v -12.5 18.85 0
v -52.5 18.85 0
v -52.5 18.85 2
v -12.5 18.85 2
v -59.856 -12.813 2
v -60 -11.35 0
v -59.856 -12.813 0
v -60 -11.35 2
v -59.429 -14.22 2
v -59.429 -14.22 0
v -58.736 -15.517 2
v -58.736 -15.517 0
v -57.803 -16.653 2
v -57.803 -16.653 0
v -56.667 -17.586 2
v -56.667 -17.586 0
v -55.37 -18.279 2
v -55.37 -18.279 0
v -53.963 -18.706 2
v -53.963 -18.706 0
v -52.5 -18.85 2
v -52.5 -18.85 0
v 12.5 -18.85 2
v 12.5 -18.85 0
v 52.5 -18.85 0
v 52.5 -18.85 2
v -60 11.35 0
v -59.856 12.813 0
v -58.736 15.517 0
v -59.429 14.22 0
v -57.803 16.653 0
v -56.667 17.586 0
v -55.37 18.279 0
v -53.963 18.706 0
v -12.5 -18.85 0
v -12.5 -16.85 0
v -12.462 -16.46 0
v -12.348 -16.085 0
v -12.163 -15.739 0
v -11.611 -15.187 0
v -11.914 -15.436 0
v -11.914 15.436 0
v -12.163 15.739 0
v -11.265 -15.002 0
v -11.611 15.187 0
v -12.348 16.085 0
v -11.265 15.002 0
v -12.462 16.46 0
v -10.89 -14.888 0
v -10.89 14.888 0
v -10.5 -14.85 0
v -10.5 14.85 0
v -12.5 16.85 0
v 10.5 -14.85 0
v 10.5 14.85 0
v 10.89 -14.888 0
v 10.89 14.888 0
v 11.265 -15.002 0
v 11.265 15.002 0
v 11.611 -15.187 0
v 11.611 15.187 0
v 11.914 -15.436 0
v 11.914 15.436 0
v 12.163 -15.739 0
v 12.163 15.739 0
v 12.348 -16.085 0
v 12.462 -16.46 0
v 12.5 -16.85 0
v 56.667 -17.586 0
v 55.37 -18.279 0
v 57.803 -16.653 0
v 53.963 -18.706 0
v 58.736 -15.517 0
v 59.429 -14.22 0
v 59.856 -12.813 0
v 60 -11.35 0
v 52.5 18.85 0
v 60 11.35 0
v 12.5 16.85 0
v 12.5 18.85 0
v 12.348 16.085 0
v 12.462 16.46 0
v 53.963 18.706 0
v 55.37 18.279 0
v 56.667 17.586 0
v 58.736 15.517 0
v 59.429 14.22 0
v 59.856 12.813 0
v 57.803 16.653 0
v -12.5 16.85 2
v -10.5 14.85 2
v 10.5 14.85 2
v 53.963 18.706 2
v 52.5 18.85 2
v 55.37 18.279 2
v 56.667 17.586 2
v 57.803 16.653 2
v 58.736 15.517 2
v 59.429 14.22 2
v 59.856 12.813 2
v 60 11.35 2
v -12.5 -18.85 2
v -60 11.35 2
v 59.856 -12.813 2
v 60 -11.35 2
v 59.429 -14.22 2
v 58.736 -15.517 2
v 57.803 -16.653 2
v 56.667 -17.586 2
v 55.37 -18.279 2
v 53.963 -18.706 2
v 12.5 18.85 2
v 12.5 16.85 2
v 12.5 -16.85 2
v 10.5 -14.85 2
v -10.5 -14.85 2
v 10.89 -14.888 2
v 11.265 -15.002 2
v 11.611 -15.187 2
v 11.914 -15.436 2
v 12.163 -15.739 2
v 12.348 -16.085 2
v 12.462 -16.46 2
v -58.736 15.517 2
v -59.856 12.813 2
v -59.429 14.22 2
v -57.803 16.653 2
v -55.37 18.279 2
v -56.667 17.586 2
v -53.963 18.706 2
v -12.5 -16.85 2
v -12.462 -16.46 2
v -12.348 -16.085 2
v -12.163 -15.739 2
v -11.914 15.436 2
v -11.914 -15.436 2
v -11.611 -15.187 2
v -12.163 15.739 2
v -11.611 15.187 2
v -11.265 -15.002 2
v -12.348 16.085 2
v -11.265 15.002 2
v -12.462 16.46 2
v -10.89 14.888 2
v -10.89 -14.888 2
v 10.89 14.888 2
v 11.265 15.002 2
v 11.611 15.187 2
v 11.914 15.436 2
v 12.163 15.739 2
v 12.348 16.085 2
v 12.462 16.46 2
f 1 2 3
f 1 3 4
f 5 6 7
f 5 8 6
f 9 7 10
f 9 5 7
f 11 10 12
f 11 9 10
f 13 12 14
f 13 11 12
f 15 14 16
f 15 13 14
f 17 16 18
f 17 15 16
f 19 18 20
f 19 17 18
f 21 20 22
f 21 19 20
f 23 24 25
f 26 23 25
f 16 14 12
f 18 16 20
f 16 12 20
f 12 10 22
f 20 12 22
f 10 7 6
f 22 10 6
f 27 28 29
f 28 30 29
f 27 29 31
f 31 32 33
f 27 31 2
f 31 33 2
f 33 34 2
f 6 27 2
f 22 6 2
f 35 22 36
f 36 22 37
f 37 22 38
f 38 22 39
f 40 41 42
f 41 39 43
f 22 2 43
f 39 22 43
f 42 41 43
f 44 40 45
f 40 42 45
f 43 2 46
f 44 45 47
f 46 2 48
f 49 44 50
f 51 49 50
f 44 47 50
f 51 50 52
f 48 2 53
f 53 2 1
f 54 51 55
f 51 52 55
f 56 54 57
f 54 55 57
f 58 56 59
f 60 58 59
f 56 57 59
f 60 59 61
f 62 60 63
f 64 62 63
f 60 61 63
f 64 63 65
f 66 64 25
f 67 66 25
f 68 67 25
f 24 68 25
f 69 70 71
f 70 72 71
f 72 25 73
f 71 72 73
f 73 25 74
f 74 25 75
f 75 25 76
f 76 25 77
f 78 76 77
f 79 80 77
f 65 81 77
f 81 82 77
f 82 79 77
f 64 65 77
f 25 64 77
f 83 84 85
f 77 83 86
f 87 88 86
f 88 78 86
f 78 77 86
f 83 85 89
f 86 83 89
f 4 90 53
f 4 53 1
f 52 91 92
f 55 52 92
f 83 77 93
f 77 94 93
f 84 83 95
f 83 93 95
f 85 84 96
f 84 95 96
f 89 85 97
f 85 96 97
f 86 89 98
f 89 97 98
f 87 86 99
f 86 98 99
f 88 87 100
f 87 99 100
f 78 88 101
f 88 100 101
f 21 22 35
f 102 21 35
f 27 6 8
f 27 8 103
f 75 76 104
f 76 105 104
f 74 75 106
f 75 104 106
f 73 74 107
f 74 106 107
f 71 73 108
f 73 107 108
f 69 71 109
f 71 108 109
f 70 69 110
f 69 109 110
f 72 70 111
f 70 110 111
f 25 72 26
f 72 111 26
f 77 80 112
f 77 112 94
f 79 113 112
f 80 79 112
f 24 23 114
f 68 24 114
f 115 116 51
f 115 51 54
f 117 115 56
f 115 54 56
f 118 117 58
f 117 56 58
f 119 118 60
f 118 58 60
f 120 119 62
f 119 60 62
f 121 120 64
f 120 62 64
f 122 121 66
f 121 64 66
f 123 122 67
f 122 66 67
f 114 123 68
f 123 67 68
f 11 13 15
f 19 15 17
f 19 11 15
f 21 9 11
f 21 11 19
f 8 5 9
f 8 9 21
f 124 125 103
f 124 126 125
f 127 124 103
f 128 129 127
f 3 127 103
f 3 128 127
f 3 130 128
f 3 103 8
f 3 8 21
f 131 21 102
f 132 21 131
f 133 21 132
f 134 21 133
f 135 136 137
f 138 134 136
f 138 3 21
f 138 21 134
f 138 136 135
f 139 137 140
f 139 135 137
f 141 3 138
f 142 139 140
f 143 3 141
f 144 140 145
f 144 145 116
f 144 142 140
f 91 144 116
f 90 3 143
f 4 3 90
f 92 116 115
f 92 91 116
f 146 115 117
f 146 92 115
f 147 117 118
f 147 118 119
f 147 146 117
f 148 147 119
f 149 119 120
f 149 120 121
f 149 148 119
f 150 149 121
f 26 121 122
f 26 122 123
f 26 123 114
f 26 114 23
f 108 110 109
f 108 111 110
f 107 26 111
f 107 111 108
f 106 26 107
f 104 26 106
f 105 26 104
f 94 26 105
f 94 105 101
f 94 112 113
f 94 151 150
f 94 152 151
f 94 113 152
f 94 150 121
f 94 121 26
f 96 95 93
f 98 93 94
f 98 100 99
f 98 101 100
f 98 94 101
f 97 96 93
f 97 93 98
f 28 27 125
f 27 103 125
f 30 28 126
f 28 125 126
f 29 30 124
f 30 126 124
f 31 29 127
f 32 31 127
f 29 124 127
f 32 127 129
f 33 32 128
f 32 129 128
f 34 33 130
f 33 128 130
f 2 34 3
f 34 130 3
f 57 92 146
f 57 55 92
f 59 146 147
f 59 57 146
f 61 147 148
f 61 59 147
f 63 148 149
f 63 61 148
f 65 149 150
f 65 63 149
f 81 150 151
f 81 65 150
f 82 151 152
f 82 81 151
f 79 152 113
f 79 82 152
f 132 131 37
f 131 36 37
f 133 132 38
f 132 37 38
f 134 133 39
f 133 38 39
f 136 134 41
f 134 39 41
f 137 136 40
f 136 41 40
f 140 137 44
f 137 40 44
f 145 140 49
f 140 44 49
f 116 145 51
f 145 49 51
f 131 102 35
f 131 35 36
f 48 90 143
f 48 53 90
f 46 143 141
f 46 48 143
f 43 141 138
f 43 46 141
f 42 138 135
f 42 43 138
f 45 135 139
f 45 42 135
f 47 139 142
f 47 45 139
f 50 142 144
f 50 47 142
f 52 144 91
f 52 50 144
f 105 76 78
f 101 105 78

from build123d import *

# Parameters (mm, degrees)
F0_W     = 120
F0_H     = 37.7
F1_DEPTH = 2
F2_W     = 25
F2_H     = 8
F3_DEPTH = 25
F4_R     = 7.5
F5_R     = 2


with BuildPart() as f1:
    # F0 (on Top) → F1 (new body)
    with BuildSketch(Plane.XY):
        Rectangle(F0_W, F0_H)
    extrude(amount=F1_DEPTH)

    # F2 (on face) → F3 (cut)
    with BuildSketch(Plane.XY.offset(2)):
        with Locations((0, 18.85)):
            Rectangle(F2_W, F2_H)
        with Locations((0, -18.85)):
            Rectangle(F2_W, F2_H)
    extrude(amount=-F3_DEPTH, mode=Mode.SUBTRACT)

    # F4
    f4_edges = [f1.edges().sort_by_distance(p)[0] for p in [
        (-60, -18.85, 1),
        (60, -18.85, 1),
        (60, 18.85, 1),
        (-60, 18.85, 1),
    ]]
    fillet(f4_edges, radius=F4_R)

    # F5
    f5_edges = [f1.edges().sort_by_distance(p)[0] for p in [
        (-12.5, 14.85, 1),
        (12.5, 14.85, 1),
        (-12.5, -14.85, 1),
        (12.5, -14.85, 1),
    ]]
    fillet(f5_edges, radius=F5_R)


solid = f1.part
